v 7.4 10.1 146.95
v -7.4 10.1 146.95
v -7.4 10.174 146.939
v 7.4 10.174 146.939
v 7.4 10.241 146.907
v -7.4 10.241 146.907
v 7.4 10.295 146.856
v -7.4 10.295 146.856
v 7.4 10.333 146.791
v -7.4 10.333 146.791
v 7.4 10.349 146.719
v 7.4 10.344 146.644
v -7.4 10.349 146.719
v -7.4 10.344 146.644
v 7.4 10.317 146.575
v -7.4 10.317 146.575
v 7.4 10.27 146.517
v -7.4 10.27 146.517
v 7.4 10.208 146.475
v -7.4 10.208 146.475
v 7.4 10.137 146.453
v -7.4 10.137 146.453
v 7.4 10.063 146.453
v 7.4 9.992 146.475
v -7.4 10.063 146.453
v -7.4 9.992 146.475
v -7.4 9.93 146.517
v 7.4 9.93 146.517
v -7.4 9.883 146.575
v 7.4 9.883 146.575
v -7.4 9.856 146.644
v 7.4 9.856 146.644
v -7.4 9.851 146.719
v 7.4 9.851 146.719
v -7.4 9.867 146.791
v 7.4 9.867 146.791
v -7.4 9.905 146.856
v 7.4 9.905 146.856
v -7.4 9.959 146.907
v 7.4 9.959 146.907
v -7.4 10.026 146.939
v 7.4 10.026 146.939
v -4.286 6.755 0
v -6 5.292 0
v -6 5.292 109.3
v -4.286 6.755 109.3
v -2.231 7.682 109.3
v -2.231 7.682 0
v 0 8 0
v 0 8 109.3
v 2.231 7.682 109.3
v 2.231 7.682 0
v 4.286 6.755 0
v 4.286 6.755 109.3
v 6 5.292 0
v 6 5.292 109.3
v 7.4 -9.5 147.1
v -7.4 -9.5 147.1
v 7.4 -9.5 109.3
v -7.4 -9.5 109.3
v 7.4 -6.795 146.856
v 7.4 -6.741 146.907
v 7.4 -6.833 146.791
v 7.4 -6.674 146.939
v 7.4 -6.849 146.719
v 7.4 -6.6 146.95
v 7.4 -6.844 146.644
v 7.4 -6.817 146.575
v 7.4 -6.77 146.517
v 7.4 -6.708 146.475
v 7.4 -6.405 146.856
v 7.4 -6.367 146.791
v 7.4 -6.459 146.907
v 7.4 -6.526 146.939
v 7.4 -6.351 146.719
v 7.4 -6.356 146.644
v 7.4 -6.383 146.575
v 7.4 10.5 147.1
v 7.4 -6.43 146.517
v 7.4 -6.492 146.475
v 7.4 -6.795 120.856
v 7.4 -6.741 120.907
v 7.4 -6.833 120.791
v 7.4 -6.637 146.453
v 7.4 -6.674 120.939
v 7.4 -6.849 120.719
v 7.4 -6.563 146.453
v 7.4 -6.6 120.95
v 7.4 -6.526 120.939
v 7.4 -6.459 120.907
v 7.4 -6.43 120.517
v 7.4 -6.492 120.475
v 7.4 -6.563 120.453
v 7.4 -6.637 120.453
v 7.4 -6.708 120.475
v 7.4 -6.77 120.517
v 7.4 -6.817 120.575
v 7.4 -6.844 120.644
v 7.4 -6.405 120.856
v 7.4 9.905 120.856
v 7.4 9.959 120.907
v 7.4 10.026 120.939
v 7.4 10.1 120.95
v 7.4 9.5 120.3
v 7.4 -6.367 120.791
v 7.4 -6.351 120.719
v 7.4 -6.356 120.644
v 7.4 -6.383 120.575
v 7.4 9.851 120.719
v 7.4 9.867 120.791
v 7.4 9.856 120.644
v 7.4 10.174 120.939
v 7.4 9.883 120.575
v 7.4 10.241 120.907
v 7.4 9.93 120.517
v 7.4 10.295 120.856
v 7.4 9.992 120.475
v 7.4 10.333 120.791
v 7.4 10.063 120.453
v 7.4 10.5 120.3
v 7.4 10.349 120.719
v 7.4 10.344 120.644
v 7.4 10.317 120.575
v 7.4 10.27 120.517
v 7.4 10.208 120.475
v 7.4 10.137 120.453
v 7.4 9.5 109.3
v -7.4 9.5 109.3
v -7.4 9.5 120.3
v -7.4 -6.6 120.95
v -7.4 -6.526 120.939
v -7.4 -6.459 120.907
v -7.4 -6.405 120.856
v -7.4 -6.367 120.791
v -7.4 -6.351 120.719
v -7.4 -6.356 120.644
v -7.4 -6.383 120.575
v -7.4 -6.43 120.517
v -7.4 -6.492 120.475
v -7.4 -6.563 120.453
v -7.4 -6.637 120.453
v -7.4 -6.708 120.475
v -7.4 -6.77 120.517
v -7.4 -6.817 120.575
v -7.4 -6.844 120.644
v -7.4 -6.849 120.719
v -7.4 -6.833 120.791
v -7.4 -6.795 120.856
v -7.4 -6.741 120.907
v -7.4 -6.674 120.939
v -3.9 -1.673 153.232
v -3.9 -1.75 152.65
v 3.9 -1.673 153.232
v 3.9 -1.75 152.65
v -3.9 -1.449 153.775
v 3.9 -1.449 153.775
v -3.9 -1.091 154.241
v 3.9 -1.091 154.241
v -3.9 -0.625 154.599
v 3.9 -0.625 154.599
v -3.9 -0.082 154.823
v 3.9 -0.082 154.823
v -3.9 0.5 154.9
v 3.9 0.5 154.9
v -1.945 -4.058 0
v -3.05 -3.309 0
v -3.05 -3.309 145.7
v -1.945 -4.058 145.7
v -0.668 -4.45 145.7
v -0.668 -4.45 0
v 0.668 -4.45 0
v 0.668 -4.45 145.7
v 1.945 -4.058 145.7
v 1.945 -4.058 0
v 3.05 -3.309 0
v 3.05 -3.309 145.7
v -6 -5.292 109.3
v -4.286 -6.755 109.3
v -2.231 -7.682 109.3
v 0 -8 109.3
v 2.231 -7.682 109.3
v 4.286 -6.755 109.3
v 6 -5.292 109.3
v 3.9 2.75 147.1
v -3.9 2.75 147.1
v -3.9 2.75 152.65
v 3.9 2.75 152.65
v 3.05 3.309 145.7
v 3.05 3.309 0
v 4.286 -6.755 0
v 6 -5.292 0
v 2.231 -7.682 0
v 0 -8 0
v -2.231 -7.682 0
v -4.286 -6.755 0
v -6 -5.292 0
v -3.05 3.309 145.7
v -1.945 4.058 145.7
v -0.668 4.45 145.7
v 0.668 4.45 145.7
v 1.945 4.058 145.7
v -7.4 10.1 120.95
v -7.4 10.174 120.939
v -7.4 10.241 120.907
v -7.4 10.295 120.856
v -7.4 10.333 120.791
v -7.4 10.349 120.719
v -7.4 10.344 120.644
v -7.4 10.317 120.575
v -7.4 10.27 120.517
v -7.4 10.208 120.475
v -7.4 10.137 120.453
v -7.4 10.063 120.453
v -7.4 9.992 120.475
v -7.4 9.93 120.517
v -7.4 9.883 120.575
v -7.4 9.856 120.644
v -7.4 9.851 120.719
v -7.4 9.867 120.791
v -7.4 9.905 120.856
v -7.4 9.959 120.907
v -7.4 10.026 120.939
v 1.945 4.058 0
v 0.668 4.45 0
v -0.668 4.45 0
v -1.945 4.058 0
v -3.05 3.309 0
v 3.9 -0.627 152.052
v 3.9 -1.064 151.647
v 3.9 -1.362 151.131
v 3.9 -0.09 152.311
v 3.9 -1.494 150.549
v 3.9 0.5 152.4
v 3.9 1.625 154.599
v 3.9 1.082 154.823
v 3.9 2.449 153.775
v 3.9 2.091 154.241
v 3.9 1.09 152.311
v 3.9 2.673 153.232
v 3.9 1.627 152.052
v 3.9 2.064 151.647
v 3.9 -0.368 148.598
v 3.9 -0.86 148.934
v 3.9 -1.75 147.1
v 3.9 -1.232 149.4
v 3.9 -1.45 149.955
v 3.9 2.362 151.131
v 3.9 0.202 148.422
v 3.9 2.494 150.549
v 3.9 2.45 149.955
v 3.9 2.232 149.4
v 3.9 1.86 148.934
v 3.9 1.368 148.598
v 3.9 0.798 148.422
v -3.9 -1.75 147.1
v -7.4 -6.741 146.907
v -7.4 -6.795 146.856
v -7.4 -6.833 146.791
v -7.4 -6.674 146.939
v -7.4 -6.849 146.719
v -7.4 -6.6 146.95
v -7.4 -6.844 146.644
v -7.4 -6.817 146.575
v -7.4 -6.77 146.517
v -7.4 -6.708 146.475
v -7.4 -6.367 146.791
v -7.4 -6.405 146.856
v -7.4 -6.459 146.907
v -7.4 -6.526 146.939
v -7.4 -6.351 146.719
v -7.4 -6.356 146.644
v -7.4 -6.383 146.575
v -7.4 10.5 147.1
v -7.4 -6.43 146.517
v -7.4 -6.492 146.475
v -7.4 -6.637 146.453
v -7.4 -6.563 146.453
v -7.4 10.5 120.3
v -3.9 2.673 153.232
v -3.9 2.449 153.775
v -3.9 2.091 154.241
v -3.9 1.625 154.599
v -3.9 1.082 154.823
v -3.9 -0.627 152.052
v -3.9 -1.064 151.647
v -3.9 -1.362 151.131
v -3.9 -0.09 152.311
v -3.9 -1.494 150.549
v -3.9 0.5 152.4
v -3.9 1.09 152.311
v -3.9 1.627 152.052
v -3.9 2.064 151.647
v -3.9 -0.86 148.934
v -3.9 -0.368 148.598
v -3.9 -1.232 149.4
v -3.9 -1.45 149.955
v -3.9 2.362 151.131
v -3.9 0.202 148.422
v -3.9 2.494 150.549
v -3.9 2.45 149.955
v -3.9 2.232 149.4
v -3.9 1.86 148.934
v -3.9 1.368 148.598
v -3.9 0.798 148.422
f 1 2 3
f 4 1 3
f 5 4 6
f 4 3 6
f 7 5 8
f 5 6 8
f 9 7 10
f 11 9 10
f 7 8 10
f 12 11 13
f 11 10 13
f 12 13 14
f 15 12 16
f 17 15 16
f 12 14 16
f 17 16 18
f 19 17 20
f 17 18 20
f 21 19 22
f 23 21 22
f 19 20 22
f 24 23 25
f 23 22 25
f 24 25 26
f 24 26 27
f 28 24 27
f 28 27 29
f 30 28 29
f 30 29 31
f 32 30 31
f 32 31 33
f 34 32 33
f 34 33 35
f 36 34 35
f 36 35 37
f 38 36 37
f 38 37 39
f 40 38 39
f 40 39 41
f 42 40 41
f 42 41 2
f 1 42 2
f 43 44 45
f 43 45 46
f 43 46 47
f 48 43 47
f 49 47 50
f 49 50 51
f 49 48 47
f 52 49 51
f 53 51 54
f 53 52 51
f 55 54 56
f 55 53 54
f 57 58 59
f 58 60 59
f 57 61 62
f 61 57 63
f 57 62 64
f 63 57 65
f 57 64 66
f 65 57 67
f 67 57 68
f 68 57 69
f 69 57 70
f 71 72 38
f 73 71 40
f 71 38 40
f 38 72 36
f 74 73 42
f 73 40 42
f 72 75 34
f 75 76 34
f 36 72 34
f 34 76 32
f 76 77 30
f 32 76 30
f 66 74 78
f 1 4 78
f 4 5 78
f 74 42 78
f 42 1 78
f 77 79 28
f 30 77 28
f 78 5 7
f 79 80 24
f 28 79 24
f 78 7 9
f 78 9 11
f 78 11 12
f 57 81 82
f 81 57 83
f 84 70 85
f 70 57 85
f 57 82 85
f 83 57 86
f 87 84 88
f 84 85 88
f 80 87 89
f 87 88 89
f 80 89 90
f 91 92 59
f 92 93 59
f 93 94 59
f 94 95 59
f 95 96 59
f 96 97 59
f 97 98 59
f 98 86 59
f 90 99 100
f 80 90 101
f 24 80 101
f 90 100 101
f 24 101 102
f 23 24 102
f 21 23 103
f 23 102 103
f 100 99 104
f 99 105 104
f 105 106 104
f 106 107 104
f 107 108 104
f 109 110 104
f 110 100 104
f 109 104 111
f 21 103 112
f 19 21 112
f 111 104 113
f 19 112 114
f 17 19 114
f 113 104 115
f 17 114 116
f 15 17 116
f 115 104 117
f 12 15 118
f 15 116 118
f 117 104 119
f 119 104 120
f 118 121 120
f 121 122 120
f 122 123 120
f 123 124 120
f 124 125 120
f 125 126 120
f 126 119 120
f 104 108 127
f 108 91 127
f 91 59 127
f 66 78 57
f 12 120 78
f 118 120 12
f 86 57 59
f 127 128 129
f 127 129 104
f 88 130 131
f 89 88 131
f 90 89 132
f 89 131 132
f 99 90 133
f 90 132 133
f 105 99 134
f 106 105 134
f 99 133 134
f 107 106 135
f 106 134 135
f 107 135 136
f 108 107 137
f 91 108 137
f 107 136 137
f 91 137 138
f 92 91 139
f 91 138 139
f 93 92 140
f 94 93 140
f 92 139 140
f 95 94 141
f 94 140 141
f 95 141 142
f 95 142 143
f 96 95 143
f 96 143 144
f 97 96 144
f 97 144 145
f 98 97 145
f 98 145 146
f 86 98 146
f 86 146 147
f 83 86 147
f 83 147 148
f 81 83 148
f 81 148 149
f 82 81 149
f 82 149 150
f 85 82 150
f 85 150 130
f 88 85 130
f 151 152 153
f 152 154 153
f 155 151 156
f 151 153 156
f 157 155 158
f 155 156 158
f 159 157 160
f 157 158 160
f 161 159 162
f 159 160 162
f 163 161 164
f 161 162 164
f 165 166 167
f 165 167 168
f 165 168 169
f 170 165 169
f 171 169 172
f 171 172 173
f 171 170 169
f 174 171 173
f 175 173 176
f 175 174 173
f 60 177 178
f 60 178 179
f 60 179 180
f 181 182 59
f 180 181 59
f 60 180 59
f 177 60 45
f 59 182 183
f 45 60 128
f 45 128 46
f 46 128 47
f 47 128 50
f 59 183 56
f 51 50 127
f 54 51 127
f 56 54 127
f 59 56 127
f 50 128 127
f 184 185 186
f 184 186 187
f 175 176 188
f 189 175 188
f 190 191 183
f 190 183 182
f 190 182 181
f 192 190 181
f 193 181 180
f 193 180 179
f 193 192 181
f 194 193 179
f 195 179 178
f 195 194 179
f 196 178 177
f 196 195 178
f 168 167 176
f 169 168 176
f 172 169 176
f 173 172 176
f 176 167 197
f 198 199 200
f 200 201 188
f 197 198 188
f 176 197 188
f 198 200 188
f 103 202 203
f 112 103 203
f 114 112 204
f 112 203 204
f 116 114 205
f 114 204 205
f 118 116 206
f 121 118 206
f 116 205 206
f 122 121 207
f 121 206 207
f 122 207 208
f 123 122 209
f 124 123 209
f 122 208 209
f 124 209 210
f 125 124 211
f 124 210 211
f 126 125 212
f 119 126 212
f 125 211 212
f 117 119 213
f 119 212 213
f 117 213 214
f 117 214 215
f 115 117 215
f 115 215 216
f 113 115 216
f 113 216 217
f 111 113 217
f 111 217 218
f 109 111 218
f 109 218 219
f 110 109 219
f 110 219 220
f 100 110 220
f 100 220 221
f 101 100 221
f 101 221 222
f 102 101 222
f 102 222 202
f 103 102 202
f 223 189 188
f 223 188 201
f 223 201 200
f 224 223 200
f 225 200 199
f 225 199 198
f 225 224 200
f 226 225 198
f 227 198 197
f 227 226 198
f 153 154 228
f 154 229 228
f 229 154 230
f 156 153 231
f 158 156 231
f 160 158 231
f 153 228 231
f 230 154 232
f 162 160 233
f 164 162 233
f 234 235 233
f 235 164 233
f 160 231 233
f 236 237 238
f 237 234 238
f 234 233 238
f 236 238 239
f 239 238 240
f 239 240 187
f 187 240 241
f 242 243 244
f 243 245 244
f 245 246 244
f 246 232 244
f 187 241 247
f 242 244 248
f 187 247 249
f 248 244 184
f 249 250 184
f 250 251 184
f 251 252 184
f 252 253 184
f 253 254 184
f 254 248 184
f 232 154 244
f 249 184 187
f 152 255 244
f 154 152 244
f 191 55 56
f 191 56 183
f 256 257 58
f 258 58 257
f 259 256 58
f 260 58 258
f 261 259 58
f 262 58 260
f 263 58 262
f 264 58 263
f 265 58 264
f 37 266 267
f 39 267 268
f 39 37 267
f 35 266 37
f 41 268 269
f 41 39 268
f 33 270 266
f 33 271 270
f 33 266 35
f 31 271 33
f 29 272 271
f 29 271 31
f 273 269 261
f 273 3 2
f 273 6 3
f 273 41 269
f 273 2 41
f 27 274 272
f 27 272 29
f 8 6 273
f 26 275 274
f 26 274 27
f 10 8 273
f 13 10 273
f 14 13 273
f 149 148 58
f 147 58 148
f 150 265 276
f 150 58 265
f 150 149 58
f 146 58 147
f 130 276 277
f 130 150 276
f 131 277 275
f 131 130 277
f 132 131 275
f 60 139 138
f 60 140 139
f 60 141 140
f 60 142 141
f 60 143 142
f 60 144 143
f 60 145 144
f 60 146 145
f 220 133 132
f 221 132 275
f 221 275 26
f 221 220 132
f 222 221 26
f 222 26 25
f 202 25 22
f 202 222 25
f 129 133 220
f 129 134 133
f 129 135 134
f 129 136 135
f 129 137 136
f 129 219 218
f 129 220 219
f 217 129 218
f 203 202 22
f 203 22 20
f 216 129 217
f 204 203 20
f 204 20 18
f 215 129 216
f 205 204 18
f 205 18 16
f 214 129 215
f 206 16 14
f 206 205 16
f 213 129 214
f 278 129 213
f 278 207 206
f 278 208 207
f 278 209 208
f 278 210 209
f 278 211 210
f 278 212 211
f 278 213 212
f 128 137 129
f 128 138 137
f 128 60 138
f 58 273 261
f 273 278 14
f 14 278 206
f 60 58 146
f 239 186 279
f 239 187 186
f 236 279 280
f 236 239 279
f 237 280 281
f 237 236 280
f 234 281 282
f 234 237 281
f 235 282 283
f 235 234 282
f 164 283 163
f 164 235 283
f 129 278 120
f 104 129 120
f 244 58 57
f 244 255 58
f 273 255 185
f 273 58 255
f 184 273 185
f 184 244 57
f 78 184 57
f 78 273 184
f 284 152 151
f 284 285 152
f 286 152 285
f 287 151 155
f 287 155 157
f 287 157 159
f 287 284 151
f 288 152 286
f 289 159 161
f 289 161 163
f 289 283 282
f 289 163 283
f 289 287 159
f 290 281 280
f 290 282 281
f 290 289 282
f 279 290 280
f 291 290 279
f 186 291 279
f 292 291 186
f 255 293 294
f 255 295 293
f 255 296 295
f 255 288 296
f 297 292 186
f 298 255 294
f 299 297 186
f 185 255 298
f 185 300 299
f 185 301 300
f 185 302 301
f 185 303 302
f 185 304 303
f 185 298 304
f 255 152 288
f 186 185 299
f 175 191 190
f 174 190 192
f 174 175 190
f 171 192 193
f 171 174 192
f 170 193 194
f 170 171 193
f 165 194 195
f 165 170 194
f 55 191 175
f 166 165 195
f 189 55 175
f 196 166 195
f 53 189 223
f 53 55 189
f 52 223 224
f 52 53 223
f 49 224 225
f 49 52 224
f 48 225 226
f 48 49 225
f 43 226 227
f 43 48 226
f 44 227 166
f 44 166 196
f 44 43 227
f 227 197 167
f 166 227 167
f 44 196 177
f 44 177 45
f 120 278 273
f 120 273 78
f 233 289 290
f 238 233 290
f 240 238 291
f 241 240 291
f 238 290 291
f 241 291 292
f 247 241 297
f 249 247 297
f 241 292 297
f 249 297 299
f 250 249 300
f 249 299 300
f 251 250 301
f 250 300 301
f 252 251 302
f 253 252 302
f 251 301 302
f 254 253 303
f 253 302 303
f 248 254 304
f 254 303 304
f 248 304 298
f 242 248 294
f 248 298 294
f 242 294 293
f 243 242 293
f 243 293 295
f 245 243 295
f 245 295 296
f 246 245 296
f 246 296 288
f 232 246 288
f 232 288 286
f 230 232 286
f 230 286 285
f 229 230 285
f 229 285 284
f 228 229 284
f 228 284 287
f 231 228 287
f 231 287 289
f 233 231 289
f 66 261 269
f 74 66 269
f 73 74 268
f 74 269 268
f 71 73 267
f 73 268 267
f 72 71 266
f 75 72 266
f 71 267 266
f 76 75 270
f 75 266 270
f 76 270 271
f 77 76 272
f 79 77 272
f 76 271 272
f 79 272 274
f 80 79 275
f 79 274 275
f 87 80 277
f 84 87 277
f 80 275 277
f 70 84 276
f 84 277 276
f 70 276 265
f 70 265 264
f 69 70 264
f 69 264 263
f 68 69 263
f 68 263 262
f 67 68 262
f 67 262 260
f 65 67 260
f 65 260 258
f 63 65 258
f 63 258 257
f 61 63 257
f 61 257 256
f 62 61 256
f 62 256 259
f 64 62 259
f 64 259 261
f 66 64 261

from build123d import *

# Parameters (mm, degrees)
BOSS_EXTRUDE2_DEPTH = 109.3
SKETCH4_W           = 14.8
SKETCH4_H           = 19
BOSS_EXTRUDE3_DEPTH = 11
SKETCH5_W           = 14.8
SKETCH5_H           = 20
BOSS_EXTRUDE4_DEPTH = 25.4
SKETCH7_W           = 14.8
SKETCH7_H           = 20
BOSS_EXTRUDE5_DEPTH = 1.4
SKETCH8_W           = 7.8
SKETCH8_H           = 4.5
BOSS_EXTRUDE6_DEPTH = 7.8
SKETCH9_R           = 2
CUT_EXTRUDE1_DEPTH  = 156.666149178
FILLET1_R           = 2.25
SKETCH10_R          = 0.25
CUT_EXTRUDE2_DEPTH  = 156.95928956


with BuildPart() as part:
    # Sketch3 → Boss-Extrude2 (new body)
    with BuildSketch(Plane.XY):
        with BuildLine():
            Line((-6, -5.291502622), (-6, 5.291502622))
            ThreePointArc((-6, 5.291502622), (0, 8), (6, 5.291502622))
            Line((6, 5.291502622), (6, -5.291502622))
            ThreePointArc((6, -5.291502622), (0, -8), (-6, -5.291502622))
        make_face()
        with BuildLine():
            Line((-3.05, -3.308700651), (-3.05, 3.308700651))
            ThreePointArc((-3.05, 3.308700651), (0, 4.5), (3.05, 3.308700651))
            Line((3.05, 3.308700651), (3.05, -3.308700651))
            ThreePointArc((3.05, -3.308700651), (0, -4.5), (-3.05, -3.308700651))
        make_face(mode=Mode.SUBTRACT)
    extrude(amount=BOSS_EXTRUDE2_DEPTH)

    # Sketch4 → Boss-Extrude3 (add)
    with BuildSketch(Plane.XY.offset(109.3)):
        Rectangle(SKETCH4_W, SKETCH4_H)
        with BuildLine():
            Line((-3.05, 3.308700651), (-3.05, -3.308700651))
            ThreePointArc((-3.05, -3.308700651), (0, -4.5), (3.05, -3.308700651))
            Line((3.05, -3.308700651), (3.05, 3.308700651))
            ThreePointArc((3.05, 3.308700651), (0, 4.5), (-3.05, 3.308700651))
        make_face(mode=Mode.SUBTRACT)
    extrude(amount=BOSS_EXTRUDE3_DEPTH)

    # Sketch5 → Boss-Extrude4 (add)
    with BuildSketch(Plane.XY.offset(120.3)):
        with Locations((0, 0.5)):
            Rectangle(SKETCH5_W, SKETCH5_H)
        with BuildLine():
            Line((-3.05, 3.308700651), (-3.05, -3.308700651))
            ThreePointArc((-3.05, -3.308700651), (0, -4.5), (3.05, -3.308700651))
            Line((3.05, -3.308700651), (3.05, 3.308700651))
            ThreePointArc((3.05, 3.308700651), (0, 4.5), (-3.05, 3.308700651))
        make_face(mode=Mode.SUBTRACT)
    extrude(amount=BOSS_EXTRUDE4_DEPTH)

    # Sketch7 → Boss-Extrude5 (add)
    with BuildSketch(Plane.XY.offset(145.7)):
        with Locations((0, 0.5)):
            Rectangle(SKETCH7_W, SKETCH7_H)
    extrude(amount=BOSS_EXTRUDE5_DEPTH)

    # Sketch8 → Boss-Extrude6 (add)
    with BuildSketch(Plane.XY.offset(147.1)):
        with Locations((0, 0.5)):
            Rectangle(SKETCH8_W, SKETCH8_H)
    extrude(amount=BOSS_EXTRUDE6_DEPTH)

    # Sketch9 → Cut-Extrude1 (cut, through all)
    with BuildSketch(Plane.ZY.offset(3.9)):
        with Locations((150.4, 0.5)):
            Circle(SKETCH9_R)
    extrude(amount=-CUT_EXTRUDE1_DEPTH, mode=Mode.SUBTRACT)

    # Fillet1
    fillet1_edges = [part.edges().sort_by_distance(p)[0] for p in [
        (0, -1.75, 154.9),
        (0, 2.75, 154.9),
    ]]
    fillet(fillet1_edges, radius=FILLET1_R - 0.0001)  # a hair under: the kernel refuses the full size

    # Sketch10 → Cut-Extrude2 (cut, through all)
    with BuildSketch(Plane.ZY.offset(7.4)):
        with Locations((120.7, -6.6)):
            Circle(SKETCH10_R)
        with Locations((146.7, -6.6)):
            Circle(SKETCH10_R)
        with Locations((120.7, 10.1)):
            Circle(SKETCH10_R)
        with Locations((146.7, 10.1)):
            Circle(SKETCH10_R)
    extrude(amount=-CUT_EXTRUDE2_DEPTH, mode=Mode.SUBTRACT)


solid = part.part
